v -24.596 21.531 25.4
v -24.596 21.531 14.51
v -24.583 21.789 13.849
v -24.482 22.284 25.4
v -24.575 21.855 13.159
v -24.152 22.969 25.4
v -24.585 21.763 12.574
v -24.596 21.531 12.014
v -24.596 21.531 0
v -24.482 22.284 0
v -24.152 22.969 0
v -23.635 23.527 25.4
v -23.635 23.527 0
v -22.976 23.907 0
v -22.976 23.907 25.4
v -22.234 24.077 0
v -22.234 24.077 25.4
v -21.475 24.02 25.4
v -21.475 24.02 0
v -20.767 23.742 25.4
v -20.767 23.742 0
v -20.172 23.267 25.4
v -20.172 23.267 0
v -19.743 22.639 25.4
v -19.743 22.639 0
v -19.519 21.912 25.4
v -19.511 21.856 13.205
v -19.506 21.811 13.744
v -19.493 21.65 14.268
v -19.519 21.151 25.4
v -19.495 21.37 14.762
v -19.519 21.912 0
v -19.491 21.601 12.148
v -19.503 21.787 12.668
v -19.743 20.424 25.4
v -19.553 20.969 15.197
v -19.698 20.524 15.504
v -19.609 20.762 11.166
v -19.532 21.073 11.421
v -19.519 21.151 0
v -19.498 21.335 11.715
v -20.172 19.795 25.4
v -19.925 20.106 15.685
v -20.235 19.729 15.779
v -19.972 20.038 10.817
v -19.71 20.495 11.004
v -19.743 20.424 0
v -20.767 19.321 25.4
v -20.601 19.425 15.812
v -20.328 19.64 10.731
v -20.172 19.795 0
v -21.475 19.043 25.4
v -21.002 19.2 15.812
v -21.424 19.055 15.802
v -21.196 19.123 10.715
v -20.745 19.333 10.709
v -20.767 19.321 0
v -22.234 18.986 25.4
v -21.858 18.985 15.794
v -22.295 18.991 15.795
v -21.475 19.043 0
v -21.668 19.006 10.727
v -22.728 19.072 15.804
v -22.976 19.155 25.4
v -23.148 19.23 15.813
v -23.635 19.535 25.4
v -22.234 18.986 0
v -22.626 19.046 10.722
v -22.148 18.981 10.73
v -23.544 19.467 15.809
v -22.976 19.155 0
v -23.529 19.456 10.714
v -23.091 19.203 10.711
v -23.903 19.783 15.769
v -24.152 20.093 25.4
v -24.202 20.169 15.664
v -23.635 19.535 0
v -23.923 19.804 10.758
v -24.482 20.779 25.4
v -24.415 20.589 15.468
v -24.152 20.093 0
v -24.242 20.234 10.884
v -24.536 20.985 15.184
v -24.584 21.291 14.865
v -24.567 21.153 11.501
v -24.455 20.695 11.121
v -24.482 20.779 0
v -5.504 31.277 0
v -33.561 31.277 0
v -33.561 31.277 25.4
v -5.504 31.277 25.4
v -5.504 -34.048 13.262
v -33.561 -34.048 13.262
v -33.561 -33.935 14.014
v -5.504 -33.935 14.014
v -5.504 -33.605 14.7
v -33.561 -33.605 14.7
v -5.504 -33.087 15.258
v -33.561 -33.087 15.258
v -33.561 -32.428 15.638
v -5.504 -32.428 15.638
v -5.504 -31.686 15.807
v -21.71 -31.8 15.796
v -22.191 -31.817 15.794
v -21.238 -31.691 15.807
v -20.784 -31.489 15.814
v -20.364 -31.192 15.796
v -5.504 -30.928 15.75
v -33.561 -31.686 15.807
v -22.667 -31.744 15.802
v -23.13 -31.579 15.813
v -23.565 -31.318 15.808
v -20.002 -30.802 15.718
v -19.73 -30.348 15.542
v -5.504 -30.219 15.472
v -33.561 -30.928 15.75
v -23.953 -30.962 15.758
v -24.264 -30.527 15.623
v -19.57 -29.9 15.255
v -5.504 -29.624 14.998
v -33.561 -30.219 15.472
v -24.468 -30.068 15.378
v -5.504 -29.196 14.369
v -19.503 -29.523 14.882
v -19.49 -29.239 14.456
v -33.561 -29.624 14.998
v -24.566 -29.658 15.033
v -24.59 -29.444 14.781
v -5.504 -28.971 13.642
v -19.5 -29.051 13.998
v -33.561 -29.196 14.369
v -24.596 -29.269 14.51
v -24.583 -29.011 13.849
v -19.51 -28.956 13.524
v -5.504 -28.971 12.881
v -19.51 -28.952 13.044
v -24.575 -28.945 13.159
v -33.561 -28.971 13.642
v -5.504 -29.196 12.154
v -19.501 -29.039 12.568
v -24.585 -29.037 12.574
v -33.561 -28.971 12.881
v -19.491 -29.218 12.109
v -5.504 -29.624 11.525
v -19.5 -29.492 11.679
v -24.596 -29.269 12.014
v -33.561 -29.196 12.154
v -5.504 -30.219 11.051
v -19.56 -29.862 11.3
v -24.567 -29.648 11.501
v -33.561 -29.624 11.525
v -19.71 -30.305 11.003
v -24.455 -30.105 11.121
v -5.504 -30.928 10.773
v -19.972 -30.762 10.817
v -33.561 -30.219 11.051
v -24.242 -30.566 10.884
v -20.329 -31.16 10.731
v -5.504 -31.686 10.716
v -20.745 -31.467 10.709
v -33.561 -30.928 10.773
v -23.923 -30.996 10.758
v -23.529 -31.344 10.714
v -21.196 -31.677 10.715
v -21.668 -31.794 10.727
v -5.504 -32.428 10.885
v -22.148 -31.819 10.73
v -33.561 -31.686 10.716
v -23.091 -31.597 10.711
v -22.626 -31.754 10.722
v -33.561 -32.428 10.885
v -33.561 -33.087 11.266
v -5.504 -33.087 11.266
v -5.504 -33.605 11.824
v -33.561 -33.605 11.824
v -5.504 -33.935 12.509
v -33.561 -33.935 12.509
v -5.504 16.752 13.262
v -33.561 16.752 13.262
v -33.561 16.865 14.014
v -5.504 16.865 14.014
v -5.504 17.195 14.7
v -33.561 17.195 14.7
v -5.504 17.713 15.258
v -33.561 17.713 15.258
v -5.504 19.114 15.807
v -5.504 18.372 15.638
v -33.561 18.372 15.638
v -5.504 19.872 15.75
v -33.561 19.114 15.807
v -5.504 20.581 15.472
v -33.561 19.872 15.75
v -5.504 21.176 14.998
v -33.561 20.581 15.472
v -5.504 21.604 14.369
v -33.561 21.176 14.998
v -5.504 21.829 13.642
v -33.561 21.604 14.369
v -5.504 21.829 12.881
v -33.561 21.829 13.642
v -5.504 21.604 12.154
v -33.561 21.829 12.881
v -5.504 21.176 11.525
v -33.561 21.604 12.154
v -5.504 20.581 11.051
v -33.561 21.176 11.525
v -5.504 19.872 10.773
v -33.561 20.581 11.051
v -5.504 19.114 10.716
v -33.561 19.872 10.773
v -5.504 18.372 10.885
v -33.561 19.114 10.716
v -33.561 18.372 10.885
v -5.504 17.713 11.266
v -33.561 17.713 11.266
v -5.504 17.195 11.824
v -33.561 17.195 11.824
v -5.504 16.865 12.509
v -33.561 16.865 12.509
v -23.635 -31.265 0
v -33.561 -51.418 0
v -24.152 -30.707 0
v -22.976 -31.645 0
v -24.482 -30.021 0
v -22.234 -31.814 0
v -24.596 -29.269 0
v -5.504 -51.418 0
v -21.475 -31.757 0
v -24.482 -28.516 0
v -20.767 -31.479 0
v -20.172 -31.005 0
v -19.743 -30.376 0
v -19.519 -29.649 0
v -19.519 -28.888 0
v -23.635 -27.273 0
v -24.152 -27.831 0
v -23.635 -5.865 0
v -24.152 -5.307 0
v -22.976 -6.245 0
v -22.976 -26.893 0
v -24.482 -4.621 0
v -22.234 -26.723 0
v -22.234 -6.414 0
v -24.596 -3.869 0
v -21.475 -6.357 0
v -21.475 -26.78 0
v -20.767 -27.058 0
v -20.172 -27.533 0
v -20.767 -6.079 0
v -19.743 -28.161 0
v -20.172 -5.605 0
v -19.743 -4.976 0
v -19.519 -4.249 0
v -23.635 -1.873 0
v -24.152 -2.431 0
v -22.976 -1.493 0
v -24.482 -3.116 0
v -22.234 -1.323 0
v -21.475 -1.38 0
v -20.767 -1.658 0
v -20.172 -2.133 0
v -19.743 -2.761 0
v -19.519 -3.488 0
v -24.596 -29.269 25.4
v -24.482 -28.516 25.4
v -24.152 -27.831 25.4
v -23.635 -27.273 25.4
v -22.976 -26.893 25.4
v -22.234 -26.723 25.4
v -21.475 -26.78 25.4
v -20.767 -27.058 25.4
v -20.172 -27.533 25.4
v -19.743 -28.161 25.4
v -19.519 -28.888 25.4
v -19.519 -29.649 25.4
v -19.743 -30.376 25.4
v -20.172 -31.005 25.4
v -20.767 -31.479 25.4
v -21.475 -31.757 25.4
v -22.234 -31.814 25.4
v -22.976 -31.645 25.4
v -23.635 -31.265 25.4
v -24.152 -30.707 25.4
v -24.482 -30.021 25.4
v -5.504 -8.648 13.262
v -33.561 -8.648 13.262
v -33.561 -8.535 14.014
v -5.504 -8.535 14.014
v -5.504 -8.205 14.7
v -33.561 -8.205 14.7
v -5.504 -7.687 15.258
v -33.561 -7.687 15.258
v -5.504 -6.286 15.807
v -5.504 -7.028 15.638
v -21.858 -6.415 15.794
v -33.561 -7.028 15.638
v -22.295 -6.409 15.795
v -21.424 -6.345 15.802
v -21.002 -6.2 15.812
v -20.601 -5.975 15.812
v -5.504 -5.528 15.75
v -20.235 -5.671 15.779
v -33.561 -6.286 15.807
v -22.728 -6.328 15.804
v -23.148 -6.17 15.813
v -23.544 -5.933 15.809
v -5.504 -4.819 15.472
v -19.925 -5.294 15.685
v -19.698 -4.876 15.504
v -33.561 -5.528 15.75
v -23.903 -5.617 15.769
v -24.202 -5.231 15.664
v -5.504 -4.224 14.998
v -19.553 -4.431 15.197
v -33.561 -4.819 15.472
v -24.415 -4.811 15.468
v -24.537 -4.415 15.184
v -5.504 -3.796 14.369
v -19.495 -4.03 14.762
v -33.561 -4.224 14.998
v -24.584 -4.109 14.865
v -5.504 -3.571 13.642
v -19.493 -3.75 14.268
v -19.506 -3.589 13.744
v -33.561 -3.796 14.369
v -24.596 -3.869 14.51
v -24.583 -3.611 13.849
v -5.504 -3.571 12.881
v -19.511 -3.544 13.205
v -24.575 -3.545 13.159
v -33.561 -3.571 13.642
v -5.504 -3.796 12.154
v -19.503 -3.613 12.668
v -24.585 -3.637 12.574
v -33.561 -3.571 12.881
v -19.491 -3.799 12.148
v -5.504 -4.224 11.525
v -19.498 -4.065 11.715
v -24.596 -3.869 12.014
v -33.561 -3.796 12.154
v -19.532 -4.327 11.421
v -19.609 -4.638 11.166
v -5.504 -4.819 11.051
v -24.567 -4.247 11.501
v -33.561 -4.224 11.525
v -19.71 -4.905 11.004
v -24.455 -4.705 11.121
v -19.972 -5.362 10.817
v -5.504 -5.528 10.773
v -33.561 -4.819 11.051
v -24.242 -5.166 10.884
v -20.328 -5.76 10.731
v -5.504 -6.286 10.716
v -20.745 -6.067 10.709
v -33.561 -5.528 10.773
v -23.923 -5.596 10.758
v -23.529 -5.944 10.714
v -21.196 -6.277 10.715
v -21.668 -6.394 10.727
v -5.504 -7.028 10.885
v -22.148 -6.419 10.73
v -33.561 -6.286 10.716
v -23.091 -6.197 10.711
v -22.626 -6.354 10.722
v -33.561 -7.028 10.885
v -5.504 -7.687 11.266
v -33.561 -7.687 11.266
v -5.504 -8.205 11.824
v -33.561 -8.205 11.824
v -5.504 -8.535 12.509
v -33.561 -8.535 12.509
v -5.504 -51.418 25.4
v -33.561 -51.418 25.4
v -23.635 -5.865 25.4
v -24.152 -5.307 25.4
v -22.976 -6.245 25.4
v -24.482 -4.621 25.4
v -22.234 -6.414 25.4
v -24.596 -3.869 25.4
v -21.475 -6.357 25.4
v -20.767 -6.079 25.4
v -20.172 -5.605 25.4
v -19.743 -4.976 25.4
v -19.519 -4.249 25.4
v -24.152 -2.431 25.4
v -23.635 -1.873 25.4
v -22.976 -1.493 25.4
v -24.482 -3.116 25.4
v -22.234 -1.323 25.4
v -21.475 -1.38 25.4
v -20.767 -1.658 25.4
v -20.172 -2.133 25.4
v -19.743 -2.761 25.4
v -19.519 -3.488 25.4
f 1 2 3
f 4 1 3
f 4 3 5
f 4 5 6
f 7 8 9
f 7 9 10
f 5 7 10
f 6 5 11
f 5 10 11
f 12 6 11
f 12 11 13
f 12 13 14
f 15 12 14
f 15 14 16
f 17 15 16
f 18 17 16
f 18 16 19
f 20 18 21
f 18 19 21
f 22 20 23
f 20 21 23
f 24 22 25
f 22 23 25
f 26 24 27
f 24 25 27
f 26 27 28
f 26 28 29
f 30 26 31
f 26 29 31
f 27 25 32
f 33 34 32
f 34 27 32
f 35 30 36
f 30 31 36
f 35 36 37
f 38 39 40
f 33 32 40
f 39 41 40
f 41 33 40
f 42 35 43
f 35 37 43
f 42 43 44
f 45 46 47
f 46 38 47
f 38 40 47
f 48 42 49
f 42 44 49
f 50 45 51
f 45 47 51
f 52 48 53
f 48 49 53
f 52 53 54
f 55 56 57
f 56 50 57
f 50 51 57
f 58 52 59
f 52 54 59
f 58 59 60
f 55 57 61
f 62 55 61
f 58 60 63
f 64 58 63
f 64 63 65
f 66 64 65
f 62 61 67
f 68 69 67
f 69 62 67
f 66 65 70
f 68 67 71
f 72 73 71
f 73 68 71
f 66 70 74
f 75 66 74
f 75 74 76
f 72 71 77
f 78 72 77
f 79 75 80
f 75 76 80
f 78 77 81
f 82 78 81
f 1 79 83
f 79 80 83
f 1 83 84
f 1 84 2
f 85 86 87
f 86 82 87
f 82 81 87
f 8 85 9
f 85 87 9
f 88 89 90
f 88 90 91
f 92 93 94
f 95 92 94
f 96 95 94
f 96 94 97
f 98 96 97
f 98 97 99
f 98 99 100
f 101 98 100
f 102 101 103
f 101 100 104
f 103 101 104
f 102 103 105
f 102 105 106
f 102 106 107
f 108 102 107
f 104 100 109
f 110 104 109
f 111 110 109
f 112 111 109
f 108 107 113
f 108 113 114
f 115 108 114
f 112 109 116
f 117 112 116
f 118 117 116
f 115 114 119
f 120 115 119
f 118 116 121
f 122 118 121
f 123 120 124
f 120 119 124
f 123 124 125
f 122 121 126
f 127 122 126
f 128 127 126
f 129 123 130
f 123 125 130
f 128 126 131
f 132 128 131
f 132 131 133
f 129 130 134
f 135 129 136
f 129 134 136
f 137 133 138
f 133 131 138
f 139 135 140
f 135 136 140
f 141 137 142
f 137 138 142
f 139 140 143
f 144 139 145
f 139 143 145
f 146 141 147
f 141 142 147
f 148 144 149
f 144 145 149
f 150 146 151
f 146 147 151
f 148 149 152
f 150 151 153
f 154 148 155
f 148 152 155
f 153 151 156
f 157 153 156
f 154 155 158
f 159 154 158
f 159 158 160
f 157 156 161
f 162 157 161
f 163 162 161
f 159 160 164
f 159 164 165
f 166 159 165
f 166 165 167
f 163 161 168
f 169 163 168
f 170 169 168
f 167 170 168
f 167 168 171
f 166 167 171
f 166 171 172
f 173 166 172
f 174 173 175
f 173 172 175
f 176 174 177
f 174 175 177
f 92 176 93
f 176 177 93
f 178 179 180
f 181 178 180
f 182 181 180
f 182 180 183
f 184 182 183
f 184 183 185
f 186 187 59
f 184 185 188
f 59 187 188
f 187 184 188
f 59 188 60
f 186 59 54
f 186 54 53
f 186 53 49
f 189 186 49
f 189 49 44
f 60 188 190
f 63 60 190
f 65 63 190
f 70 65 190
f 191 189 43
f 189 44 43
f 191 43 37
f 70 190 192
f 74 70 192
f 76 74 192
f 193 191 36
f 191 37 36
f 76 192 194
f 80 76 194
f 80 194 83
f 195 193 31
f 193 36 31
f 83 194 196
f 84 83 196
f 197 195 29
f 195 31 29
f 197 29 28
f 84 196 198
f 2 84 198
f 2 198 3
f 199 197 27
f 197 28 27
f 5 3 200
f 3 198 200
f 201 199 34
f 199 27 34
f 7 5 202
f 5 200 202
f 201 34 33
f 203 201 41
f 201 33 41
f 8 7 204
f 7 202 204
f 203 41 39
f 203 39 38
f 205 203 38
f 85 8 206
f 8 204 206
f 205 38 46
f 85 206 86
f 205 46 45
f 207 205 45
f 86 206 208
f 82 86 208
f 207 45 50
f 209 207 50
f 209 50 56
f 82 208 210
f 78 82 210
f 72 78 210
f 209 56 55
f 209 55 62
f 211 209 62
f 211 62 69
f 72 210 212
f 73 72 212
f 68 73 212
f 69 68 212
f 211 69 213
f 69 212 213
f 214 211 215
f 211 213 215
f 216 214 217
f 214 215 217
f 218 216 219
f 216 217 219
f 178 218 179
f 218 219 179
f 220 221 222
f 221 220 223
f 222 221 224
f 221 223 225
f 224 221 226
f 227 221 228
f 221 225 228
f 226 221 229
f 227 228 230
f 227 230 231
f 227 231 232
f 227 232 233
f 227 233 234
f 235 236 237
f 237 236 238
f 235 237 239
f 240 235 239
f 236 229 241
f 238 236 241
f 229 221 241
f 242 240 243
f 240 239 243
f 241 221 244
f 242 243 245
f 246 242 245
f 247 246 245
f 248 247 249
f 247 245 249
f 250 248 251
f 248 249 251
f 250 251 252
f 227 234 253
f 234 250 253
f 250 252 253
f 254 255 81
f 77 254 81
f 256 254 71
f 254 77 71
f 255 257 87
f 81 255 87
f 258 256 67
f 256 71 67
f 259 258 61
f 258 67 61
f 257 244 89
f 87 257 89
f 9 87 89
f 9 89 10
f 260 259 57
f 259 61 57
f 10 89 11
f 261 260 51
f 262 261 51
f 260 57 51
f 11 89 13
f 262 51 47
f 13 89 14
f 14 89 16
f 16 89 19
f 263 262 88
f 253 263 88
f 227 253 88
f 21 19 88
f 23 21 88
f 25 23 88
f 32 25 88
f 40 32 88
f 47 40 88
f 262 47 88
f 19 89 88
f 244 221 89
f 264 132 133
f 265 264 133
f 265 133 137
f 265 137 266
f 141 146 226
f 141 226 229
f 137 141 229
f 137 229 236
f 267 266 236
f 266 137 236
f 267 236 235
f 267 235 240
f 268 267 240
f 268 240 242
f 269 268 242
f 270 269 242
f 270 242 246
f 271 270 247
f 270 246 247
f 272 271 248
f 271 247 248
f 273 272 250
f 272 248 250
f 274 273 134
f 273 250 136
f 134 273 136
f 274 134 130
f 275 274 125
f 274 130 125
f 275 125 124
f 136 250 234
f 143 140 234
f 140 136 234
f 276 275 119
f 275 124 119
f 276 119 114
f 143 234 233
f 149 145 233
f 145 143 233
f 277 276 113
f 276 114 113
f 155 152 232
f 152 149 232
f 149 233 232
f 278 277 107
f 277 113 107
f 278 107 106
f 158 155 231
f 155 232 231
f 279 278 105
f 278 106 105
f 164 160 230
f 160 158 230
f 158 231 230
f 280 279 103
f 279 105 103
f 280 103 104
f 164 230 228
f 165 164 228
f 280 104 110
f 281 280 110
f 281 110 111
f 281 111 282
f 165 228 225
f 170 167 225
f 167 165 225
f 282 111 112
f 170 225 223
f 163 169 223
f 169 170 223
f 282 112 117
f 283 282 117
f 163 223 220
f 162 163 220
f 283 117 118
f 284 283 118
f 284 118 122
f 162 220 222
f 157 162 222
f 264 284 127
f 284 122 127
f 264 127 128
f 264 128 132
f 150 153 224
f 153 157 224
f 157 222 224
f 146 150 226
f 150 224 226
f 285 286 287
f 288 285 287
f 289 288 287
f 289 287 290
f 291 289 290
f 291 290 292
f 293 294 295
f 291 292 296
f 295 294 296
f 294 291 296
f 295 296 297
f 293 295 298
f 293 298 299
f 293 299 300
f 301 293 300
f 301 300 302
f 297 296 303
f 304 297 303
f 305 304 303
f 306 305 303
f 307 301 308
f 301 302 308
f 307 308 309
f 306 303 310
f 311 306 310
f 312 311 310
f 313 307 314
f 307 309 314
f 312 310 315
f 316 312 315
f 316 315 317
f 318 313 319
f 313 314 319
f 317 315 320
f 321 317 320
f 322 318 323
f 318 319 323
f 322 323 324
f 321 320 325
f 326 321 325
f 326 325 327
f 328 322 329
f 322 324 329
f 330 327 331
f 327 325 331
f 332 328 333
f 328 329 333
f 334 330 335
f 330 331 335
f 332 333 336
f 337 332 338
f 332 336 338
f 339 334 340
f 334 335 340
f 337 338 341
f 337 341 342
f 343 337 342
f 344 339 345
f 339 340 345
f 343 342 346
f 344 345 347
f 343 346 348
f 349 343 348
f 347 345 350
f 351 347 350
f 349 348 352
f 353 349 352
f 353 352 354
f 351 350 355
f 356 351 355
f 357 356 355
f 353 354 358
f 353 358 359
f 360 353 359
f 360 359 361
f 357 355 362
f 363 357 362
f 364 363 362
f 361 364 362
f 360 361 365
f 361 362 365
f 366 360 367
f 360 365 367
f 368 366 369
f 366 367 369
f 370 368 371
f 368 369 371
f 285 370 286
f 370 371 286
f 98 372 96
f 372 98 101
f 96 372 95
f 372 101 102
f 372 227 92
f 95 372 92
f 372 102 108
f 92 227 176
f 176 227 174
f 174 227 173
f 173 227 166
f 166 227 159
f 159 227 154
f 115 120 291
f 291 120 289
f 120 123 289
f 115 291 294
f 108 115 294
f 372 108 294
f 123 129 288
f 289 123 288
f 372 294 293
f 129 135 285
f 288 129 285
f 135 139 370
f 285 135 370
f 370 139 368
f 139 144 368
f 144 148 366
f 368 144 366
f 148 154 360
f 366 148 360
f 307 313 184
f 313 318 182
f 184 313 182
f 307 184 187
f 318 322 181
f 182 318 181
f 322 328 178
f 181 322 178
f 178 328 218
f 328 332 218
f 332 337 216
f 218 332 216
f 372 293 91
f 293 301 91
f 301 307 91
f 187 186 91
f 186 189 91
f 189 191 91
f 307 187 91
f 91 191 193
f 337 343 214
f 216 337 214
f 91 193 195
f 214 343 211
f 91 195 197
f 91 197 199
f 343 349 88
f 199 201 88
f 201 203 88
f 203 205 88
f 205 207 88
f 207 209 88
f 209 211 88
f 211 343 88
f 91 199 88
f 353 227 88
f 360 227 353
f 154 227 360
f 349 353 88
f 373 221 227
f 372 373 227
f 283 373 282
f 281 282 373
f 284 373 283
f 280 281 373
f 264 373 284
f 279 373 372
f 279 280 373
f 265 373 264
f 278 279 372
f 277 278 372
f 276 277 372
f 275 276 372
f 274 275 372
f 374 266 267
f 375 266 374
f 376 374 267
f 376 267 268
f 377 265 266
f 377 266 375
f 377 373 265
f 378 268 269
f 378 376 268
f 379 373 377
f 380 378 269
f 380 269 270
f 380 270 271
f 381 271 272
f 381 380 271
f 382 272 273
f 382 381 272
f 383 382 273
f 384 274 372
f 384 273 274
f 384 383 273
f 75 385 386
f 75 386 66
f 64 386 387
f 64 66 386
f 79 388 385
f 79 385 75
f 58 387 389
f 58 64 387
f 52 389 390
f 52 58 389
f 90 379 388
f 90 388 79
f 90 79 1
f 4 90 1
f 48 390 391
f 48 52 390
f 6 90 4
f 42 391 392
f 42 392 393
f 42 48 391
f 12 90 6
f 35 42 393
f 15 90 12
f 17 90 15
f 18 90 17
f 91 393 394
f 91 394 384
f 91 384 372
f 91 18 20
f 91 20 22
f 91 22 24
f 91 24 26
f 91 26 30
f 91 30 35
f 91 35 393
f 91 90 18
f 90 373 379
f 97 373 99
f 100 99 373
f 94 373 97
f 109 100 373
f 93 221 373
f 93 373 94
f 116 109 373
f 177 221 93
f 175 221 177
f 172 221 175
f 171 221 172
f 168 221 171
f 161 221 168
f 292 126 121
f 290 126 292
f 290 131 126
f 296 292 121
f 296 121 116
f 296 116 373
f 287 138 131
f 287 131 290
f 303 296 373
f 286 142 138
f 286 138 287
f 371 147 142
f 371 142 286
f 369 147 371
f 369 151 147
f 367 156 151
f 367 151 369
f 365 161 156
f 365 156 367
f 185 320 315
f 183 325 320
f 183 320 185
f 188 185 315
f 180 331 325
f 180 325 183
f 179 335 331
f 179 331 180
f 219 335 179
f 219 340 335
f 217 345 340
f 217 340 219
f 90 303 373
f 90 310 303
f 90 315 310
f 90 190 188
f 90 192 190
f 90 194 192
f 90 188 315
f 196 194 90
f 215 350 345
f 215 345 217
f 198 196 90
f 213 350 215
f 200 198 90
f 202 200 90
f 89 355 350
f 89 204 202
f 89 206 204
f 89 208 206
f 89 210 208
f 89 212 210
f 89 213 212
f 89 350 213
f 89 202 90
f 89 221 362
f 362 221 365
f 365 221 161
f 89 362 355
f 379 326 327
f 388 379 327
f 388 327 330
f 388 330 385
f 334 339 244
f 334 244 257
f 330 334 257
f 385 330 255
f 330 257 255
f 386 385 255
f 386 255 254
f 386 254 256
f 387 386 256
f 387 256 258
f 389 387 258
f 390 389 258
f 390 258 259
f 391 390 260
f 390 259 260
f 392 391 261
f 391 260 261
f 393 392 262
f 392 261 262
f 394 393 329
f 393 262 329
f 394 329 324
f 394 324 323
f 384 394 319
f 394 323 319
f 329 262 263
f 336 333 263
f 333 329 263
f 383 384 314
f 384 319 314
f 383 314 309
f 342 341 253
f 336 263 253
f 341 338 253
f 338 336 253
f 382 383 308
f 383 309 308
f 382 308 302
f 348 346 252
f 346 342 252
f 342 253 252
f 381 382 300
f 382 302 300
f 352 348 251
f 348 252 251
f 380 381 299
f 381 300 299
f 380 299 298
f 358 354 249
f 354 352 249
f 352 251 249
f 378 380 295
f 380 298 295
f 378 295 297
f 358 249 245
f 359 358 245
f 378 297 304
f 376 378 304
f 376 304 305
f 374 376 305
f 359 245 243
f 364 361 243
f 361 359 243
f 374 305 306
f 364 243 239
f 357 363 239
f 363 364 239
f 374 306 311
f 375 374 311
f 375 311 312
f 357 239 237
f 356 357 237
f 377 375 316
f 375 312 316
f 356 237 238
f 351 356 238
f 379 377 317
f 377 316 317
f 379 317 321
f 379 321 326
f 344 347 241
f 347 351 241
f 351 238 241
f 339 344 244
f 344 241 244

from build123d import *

# Parameters (mm, degrees)
F0_W     = 28.057197
F0_H     = 82.694904
F1_DEPTH = 25.4
F4_D     = 5.1054
F5_D     = 5.1054


with BuildPart() as f1:
    # F0 (on Top) → F1 (new body)
    with BuildSketch(Plane.XY):
        with Locations((-19.532638, -10.070052)):
            Rectangle(F0_W, F0_H)
    extrude(amount=F1_DEPTH)

    # F4 (through all)
    with Locations(Plane.YZ.offset(-5.50404)):
        with Locations((19.304432, 13.261723), (-6.095568, 13.261723), (-31.495568, 13.261723)):
            Hole(F4_D / 2)

    # F5 (through all)
    with Locations(Plane.XY.offset(25.4)):
        with Locations((-22.04302, 21.531211), (-22.04302, -3.868789), (-22.04302, -29.268789)):
            Hole(F5_D / 2)


solid = f1.part
